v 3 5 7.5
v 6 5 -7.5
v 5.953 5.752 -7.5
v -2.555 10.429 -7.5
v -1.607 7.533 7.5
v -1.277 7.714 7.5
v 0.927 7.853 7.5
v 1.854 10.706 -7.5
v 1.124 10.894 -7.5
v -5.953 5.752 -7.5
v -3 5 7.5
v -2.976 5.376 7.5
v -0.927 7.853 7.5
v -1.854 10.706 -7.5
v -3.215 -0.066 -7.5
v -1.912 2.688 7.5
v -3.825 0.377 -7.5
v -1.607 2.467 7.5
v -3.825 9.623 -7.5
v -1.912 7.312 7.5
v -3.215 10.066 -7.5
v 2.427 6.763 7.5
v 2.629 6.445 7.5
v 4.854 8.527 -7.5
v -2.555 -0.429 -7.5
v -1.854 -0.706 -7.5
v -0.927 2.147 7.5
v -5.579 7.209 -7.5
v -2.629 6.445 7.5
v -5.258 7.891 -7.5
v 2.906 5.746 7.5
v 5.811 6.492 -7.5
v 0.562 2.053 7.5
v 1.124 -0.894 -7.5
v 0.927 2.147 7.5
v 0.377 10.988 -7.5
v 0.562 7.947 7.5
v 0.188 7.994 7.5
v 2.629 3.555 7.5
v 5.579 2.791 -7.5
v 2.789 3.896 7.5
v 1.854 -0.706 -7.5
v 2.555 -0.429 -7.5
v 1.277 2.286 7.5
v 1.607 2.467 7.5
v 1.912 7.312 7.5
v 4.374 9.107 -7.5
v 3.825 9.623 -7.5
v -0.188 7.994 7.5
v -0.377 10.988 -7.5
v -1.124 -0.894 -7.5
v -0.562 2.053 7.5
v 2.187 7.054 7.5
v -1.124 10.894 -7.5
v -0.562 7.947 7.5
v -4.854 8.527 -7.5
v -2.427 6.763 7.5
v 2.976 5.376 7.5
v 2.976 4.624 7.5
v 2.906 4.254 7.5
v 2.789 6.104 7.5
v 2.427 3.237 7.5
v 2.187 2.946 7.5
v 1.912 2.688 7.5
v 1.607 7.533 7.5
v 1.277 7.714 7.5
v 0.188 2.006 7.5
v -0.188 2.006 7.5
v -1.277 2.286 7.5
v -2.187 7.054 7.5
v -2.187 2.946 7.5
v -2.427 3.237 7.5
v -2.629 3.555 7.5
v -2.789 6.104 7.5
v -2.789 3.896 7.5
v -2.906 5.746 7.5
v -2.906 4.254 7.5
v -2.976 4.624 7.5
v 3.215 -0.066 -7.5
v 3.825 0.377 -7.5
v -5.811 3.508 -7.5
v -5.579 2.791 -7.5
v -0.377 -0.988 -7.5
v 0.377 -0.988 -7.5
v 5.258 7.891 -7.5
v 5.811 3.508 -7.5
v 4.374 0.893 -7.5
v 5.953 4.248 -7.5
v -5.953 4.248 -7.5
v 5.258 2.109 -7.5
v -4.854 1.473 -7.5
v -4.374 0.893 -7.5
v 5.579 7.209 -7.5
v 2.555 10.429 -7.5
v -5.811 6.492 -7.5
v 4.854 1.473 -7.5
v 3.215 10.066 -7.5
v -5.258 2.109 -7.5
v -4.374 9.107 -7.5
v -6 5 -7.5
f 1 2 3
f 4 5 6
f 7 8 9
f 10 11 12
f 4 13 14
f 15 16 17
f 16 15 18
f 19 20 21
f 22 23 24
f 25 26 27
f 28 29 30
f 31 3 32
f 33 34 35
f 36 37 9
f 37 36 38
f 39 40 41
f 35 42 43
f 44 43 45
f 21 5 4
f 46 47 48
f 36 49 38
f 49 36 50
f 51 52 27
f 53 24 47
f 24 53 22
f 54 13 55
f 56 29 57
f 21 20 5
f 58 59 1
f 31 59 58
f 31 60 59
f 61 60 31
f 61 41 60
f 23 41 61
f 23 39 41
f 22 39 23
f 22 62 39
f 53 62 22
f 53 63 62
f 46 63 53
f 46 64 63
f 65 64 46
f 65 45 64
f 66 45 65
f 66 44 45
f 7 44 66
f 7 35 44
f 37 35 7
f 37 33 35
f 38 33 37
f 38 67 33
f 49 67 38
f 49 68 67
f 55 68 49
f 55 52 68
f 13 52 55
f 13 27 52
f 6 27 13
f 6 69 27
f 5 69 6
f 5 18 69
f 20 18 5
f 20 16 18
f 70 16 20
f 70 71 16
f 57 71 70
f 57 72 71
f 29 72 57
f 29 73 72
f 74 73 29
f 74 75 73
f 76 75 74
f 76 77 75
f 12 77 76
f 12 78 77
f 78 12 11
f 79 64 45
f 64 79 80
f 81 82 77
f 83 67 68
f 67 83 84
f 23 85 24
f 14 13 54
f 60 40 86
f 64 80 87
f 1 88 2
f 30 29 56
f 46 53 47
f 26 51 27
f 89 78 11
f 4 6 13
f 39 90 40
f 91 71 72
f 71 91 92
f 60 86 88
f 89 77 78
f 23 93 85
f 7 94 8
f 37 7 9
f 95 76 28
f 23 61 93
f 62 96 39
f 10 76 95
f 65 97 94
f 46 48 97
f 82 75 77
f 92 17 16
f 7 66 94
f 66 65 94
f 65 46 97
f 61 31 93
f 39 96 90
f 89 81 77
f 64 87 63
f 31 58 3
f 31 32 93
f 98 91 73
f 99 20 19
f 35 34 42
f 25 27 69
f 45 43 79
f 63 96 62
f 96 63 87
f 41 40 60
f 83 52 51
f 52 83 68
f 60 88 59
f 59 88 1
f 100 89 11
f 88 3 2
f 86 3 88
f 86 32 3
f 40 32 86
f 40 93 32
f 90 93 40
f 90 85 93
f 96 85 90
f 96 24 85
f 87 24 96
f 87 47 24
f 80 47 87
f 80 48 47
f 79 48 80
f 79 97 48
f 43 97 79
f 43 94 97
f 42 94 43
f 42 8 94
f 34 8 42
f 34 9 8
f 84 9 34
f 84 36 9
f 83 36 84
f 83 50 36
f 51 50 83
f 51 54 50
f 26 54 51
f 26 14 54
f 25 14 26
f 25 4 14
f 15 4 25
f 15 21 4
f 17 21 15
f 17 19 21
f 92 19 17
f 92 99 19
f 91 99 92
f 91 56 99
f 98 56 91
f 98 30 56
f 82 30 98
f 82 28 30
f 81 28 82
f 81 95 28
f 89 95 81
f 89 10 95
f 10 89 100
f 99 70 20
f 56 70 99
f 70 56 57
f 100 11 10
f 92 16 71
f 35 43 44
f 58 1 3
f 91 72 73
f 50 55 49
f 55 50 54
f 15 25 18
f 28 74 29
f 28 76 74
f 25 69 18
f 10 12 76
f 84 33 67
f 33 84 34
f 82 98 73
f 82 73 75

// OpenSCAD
$fn = 50;


difference() {
	union() {
		translate(v = [0, 5, -7.5000000000]) {
			cylinder(h = 15, r1 = 6, r2 = 3);
		}
	}
	union();
}
